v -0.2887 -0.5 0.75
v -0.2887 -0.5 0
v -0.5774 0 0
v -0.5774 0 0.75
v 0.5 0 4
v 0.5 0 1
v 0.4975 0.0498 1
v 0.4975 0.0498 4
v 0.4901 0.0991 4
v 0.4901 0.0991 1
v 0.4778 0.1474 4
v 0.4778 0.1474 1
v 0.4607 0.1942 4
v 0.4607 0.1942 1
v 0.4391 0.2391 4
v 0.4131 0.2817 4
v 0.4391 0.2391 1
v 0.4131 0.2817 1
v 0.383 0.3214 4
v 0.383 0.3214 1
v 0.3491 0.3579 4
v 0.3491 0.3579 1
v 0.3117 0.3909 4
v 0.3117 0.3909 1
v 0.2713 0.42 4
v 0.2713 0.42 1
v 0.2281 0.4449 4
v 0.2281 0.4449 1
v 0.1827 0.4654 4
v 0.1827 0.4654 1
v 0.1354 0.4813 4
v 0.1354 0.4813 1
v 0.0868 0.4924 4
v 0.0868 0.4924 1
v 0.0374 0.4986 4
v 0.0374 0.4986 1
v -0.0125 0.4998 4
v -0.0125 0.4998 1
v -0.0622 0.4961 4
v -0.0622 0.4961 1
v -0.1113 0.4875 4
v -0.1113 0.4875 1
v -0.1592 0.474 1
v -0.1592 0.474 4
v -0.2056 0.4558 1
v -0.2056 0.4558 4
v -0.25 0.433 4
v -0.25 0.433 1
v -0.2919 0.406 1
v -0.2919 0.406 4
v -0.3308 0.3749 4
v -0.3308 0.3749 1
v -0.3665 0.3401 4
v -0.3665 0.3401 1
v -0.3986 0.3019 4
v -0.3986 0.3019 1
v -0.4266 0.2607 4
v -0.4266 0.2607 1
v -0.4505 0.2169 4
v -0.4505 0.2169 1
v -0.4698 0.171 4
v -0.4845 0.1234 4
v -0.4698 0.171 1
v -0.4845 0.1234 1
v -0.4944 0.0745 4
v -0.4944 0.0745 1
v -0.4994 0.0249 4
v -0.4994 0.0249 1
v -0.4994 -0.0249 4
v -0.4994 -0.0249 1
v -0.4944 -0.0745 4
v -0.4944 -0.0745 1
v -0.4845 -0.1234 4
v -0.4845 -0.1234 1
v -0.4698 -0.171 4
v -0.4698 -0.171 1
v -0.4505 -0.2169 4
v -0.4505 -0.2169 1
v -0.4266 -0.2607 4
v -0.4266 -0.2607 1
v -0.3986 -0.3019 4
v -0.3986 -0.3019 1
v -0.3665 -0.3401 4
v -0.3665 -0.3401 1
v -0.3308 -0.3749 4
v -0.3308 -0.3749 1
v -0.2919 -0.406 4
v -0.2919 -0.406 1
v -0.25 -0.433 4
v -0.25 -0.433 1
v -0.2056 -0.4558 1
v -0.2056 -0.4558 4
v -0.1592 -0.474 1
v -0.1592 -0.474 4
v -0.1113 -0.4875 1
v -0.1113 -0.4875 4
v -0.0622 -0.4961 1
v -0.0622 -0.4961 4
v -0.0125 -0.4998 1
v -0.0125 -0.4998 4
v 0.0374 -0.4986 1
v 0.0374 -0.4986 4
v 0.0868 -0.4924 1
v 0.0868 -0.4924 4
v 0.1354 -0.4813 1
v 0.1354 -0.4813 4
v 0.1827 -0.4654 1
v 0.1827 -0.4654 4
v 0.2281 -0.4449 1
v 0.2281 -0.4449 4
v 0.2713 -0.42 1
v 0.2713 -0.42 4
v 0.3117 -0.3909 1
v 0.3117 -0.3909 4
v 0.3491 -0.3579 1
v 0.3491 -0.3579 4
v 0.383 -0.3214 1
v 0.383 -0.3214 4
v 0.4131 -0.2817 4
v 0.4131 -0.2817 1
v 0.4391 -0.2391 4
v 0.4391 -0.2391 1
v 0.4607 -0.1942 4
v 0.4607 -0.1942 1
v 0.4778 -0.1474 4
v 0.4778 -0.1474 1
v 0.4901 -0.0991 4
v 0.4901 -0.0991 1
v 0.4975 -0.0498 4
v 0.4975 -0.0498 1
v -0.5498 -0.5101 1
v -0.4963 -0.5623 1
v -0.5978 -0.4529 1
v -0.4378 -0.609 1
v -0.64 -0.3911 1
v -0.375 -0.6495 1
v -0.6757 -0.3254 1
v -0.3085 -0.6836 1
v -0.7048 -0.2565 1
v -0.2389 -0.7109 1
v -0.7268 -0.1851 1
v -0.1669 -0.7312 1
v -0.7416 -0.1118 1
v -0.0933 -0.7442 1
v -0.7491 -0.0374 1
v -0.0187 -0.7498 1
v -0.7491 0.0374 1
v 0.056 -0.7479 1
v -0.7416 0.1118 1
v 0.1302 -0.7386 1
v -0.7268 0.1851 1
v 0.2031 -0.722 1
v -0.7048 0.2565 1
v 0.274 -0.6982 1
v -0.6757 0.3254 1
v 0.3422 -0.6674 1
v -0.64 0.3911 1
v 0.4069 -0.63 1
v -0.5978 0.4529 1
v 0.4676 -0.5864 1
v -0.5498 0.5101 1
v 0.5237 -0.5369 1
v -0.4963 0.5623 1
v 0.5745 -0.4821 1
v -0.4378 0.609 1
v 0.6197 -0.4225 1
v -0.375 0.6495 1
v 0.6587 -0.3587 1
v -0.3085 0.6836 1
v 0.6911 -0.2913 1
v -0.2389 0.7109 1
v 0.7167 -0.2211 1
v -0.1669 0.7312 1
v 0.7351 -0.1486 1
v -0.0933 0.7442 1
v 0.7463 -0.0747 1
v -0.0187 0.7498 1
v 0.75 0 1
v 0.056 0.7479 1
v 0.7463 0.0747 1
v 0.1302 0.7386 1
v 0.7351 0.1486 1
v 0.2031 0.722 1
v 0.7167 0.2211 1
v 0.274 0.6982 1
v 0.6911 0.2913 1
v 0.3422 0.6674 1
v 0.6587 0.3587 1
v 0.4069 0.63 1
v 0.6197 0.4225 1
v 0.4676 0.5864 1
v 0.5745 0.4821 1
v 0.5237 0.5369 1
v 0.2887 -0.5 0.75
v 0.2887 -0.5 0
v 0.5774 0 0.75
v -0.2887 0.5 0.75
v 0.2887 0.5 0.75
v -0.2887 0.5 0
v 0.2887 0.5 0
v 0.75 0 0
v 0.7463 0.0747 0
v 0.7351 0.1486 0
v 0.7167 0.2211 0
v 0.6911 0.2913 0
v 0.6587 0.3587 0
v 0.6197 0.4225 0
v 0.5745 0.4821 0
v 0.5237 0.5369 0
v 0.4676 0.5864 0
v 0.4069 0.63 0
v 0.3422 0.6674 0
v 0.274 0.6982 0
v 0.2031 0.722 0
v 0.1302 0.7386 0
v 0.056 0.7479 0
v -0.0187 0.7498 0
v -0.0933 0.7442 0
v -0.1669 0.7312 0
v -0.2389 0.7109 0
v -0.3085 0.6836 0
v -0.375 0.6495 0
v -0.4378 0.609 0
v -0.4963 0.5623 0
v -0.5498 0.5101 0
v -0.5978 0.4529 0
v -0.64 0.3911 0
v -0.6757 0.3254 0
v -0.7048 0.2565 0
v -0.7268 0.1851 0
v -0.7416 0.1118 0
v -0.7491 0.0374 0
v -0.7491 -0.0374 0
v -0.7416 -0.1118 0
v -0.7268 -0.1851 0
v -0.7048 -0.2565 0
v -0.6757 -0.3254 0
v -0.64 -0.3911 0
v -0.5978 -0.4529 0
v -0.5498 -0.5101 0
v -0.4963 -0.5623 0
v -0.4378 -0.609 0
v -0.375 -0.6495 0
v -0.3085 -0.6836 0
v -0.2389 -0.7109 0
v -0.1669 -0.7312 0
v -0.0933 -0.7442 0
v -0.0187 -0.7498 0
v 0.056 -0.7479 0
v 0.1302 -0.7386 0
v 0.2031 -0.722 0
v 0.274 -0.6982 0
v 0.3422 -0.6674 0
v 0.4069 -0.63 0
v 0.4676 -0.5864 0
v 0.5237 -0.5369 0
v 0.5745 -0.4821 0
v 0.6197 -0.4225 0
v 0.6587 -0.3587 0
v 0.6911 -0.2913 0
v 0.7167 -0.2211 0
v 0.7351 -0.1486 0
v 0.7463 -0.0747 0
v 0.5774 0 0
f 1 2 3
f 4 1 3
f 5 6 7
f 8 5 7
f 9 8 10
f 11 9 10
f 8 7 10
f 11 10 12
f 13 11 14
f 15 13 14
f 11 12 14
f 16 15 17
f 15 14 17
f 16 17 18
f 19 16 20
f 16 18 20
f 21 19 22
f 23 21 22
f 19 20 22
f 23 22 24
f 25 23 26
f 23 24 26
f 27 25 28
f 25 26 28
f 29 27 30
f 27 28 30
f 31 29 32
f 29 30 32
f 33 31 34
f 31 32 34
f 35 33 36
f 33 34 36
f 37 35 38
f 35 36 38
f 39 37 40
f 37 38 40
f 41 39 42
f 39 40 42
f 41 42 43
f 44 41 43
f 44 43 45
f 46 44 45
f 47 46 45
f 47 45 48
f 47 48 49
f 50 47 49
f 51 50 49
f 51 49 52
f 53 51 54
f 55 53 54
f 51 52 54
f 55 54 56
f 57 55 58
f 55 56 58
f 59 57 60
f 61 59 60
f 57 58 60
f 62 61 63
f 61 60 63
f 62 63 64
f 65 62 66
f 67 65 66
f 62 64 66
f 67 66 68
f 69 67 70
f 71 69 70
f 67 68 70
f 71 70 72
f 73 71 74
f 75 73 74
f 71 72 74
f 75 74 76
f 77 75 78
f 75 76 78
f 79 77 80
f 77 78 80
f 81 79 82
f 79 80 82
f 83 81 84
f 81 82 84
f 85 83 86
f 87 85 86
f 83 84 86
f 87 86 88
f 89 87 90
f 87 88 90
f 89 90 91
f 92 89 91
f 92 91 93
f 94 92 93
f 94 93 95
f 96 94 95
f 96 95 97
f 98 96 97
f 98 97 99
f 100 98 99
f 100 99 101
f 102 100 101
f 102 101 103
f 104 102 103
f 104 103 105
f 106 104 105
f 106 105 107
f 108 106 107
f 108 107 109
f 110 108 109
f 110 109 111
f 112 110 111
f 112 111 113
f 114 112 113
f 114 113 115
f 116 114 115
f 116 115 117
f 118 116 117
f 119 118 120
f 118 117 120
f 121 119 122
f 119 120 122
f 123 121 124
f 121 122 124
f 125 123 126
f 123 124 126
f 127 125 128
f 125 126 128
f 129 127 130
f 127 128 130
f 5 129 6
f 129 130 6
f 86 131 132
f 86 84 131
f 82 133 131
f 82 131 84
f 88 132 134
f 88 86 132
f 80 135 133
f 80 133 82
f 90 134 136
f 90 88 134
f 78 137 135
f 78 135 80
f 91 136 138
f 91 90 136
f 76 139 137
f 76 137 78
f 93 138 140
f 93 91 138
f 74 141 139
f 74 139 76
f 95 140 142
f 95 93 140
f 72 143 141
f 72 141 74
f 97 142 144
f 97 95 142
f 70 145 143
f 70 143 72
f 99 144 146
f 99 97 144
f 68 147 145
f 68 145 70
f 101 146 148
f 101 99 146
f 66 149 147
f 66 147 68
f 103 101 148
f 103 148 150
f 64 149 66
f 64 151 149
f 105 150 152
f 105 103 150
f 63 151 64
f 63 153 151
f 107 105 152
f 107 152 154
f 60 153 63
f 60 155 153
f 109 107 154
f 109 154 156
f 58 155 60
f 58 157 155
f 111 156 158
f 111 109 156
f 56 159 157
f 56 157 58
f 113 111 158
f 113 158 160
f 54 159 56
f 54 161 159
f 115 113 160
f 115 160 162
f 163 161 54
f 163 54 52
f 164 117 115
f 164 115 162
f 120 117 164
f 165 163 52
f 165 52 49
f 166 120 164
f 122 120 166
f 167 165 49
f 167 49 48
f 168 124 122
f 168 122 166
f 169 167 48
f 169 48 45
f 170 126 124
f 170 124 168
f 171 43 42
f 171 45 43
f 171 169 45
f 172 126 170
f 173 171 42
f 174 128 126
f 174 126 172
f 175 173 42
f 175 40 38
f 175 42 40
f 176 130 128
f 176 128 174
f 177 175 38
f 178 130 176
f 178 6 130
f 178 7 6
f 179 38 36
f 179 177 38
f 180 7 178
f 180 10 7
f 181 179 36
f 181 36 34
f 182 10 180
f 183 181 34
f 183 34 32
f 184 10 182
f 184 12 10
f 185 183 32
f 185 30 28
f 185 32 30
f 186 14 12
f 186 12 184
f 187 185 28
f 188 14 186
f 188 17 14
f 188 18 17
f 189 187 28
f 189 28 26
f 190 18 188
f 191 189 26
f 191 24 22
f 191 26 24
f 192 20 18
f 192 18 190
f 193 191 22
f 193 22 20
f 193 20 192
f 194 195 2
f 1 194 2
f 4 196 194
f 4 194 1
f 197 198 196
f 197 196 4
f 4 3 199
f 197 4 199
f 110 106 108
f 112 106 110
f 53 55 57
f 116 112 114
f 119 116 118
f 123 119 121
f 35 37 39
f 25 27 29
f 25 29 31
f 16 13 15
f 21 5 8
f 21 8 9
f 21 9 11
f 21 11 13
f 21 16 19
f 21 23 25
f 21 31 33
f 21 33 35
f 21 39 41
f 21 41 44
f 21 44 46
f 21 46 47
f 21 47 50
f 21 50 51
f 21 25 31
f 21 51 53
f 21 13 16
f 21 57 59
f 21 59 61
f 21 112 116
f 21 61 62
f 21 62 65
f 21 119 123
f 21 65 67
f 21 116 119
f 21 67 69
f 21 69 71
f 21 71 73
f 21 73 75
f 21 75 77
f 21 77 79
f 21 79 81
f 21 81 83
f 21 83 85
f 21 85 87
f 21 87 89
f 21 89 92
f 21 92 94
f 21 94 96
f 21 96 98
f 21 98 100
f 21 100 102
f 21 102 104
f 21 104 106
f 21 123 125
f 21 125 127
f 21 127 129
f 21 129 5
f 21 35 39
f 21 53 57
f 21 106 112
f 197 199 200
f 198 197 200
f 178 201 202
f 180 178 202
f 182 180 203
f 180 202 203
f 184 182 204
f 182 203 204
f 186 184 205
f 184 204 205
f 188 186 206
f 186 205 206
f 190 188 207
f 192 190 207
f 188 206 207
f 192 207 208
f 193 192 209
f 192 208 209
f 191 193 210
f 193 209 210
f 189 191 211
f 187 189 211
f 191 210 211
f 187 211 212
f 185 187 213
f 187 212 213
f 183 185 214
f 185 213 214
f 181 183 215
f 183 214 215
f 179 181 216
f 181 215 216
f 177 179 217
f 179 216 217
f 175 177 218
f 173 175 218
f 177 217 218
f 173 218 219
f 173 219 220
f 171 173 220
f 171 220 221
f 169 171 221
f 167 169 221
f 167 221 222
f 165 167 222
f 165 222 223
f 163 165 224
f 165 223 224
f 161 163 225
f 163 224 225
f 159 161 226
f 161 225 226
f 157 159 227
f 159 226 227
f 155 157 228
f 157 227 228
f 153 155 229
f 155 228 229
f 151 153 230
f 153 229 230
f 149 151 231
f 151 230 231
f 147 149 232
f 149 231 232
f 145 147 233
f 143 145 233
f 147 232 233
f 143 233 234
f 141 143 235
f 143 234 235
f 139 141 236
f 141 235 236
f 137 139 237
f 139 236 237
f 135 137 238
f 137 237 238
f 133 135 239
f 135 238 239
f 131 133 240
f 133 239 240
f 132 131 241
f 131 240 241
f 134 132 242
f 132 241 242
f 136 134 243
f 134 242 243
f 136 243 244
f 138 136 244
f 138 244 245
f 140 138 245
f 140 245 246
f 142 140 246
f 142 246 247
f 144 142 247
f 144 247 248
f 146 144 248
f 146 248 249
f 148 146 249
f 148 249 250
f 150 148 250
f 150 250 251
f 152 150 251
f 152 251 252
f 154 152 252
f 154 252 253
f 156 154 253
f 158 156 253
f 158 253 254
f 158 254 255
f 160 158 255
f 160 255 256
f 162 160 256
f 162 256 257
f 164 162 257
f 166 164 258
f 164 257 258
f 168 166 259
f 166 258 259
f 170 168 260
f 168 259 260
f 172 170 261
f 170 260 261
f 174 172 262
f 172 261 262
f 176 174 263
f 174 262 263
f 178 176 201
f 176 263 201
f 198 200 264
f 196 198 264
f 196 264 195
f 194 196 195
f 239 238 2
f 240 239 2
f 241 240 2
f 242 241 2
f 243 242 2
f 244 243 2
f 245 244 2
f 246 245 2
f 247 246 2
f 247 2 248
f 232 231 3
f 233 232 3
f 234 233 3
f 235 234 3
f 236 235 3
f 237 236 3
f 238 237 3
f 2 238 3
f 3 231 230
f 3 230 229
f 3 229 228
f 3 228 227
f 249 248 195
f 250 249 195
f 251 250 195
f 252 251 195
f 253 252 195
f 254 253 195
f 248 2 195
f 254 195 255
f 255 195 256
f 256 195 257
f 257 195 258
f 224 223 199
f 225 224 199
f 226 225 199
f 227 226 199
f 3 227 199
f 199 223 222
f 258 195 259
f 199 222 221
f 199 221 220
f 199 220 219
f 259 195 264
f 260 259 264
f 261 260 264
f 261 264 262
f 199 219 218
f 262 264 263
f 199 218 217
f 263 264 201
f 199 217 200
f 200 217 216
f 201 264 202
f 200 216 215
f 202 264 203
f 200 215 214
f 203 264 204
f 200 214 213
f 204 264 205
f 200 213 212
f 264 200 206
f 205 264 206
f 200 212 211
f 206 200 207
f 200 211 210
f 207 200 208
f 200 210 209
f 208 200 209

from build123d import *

# Parameters (mm, degrees)
CROQUIS1_R              = 0.75
SALIENTE_EXTRUIR1_DEPTH = 1
CROQUIS2_R              = 0.5
SALIENTE_EXTRUIR2_DEPTH = 3
CORTAR_EXTRUIR1_DEPTH   = 0.75


with BuildPart() as part:
    # Croquis1 → Saliente-Extruir1 (new body)
    with BuildSketch(Plane.XY):
        Circle(CROQUIS1_R)
    extrude(amount=SALIENTE_EXTRUIR1_DEPTH)

    # Croquis2 → Saliente-Extruir2 (add)
    with BuildSketch(Plane.XY.offset(1)):
        Circle(CROQUIS2_R)
    extrude(amount=SALIENTE_EXTRUIR2_DEPTH)

    # Croquis3 → Cortar-Extruir1 (cut)
    with BuildSketch(Plane(origin=(0, 0, 0), x_dir=(-1, 0, 0), z_dir=(0, 0, -1))):
        Polygon((0.577350269, 0), (0.288675135, 0.5), (-0.288675135, 0.5), (-0.577350269, 0), (-0.288675135, -0.5), (0.288675135, -0.5), align=None)
    extrude(amount=-CORTAR_EXTRUIR1_DEPTH, mode=Mode.SUBTRACT)


solid = part.part
